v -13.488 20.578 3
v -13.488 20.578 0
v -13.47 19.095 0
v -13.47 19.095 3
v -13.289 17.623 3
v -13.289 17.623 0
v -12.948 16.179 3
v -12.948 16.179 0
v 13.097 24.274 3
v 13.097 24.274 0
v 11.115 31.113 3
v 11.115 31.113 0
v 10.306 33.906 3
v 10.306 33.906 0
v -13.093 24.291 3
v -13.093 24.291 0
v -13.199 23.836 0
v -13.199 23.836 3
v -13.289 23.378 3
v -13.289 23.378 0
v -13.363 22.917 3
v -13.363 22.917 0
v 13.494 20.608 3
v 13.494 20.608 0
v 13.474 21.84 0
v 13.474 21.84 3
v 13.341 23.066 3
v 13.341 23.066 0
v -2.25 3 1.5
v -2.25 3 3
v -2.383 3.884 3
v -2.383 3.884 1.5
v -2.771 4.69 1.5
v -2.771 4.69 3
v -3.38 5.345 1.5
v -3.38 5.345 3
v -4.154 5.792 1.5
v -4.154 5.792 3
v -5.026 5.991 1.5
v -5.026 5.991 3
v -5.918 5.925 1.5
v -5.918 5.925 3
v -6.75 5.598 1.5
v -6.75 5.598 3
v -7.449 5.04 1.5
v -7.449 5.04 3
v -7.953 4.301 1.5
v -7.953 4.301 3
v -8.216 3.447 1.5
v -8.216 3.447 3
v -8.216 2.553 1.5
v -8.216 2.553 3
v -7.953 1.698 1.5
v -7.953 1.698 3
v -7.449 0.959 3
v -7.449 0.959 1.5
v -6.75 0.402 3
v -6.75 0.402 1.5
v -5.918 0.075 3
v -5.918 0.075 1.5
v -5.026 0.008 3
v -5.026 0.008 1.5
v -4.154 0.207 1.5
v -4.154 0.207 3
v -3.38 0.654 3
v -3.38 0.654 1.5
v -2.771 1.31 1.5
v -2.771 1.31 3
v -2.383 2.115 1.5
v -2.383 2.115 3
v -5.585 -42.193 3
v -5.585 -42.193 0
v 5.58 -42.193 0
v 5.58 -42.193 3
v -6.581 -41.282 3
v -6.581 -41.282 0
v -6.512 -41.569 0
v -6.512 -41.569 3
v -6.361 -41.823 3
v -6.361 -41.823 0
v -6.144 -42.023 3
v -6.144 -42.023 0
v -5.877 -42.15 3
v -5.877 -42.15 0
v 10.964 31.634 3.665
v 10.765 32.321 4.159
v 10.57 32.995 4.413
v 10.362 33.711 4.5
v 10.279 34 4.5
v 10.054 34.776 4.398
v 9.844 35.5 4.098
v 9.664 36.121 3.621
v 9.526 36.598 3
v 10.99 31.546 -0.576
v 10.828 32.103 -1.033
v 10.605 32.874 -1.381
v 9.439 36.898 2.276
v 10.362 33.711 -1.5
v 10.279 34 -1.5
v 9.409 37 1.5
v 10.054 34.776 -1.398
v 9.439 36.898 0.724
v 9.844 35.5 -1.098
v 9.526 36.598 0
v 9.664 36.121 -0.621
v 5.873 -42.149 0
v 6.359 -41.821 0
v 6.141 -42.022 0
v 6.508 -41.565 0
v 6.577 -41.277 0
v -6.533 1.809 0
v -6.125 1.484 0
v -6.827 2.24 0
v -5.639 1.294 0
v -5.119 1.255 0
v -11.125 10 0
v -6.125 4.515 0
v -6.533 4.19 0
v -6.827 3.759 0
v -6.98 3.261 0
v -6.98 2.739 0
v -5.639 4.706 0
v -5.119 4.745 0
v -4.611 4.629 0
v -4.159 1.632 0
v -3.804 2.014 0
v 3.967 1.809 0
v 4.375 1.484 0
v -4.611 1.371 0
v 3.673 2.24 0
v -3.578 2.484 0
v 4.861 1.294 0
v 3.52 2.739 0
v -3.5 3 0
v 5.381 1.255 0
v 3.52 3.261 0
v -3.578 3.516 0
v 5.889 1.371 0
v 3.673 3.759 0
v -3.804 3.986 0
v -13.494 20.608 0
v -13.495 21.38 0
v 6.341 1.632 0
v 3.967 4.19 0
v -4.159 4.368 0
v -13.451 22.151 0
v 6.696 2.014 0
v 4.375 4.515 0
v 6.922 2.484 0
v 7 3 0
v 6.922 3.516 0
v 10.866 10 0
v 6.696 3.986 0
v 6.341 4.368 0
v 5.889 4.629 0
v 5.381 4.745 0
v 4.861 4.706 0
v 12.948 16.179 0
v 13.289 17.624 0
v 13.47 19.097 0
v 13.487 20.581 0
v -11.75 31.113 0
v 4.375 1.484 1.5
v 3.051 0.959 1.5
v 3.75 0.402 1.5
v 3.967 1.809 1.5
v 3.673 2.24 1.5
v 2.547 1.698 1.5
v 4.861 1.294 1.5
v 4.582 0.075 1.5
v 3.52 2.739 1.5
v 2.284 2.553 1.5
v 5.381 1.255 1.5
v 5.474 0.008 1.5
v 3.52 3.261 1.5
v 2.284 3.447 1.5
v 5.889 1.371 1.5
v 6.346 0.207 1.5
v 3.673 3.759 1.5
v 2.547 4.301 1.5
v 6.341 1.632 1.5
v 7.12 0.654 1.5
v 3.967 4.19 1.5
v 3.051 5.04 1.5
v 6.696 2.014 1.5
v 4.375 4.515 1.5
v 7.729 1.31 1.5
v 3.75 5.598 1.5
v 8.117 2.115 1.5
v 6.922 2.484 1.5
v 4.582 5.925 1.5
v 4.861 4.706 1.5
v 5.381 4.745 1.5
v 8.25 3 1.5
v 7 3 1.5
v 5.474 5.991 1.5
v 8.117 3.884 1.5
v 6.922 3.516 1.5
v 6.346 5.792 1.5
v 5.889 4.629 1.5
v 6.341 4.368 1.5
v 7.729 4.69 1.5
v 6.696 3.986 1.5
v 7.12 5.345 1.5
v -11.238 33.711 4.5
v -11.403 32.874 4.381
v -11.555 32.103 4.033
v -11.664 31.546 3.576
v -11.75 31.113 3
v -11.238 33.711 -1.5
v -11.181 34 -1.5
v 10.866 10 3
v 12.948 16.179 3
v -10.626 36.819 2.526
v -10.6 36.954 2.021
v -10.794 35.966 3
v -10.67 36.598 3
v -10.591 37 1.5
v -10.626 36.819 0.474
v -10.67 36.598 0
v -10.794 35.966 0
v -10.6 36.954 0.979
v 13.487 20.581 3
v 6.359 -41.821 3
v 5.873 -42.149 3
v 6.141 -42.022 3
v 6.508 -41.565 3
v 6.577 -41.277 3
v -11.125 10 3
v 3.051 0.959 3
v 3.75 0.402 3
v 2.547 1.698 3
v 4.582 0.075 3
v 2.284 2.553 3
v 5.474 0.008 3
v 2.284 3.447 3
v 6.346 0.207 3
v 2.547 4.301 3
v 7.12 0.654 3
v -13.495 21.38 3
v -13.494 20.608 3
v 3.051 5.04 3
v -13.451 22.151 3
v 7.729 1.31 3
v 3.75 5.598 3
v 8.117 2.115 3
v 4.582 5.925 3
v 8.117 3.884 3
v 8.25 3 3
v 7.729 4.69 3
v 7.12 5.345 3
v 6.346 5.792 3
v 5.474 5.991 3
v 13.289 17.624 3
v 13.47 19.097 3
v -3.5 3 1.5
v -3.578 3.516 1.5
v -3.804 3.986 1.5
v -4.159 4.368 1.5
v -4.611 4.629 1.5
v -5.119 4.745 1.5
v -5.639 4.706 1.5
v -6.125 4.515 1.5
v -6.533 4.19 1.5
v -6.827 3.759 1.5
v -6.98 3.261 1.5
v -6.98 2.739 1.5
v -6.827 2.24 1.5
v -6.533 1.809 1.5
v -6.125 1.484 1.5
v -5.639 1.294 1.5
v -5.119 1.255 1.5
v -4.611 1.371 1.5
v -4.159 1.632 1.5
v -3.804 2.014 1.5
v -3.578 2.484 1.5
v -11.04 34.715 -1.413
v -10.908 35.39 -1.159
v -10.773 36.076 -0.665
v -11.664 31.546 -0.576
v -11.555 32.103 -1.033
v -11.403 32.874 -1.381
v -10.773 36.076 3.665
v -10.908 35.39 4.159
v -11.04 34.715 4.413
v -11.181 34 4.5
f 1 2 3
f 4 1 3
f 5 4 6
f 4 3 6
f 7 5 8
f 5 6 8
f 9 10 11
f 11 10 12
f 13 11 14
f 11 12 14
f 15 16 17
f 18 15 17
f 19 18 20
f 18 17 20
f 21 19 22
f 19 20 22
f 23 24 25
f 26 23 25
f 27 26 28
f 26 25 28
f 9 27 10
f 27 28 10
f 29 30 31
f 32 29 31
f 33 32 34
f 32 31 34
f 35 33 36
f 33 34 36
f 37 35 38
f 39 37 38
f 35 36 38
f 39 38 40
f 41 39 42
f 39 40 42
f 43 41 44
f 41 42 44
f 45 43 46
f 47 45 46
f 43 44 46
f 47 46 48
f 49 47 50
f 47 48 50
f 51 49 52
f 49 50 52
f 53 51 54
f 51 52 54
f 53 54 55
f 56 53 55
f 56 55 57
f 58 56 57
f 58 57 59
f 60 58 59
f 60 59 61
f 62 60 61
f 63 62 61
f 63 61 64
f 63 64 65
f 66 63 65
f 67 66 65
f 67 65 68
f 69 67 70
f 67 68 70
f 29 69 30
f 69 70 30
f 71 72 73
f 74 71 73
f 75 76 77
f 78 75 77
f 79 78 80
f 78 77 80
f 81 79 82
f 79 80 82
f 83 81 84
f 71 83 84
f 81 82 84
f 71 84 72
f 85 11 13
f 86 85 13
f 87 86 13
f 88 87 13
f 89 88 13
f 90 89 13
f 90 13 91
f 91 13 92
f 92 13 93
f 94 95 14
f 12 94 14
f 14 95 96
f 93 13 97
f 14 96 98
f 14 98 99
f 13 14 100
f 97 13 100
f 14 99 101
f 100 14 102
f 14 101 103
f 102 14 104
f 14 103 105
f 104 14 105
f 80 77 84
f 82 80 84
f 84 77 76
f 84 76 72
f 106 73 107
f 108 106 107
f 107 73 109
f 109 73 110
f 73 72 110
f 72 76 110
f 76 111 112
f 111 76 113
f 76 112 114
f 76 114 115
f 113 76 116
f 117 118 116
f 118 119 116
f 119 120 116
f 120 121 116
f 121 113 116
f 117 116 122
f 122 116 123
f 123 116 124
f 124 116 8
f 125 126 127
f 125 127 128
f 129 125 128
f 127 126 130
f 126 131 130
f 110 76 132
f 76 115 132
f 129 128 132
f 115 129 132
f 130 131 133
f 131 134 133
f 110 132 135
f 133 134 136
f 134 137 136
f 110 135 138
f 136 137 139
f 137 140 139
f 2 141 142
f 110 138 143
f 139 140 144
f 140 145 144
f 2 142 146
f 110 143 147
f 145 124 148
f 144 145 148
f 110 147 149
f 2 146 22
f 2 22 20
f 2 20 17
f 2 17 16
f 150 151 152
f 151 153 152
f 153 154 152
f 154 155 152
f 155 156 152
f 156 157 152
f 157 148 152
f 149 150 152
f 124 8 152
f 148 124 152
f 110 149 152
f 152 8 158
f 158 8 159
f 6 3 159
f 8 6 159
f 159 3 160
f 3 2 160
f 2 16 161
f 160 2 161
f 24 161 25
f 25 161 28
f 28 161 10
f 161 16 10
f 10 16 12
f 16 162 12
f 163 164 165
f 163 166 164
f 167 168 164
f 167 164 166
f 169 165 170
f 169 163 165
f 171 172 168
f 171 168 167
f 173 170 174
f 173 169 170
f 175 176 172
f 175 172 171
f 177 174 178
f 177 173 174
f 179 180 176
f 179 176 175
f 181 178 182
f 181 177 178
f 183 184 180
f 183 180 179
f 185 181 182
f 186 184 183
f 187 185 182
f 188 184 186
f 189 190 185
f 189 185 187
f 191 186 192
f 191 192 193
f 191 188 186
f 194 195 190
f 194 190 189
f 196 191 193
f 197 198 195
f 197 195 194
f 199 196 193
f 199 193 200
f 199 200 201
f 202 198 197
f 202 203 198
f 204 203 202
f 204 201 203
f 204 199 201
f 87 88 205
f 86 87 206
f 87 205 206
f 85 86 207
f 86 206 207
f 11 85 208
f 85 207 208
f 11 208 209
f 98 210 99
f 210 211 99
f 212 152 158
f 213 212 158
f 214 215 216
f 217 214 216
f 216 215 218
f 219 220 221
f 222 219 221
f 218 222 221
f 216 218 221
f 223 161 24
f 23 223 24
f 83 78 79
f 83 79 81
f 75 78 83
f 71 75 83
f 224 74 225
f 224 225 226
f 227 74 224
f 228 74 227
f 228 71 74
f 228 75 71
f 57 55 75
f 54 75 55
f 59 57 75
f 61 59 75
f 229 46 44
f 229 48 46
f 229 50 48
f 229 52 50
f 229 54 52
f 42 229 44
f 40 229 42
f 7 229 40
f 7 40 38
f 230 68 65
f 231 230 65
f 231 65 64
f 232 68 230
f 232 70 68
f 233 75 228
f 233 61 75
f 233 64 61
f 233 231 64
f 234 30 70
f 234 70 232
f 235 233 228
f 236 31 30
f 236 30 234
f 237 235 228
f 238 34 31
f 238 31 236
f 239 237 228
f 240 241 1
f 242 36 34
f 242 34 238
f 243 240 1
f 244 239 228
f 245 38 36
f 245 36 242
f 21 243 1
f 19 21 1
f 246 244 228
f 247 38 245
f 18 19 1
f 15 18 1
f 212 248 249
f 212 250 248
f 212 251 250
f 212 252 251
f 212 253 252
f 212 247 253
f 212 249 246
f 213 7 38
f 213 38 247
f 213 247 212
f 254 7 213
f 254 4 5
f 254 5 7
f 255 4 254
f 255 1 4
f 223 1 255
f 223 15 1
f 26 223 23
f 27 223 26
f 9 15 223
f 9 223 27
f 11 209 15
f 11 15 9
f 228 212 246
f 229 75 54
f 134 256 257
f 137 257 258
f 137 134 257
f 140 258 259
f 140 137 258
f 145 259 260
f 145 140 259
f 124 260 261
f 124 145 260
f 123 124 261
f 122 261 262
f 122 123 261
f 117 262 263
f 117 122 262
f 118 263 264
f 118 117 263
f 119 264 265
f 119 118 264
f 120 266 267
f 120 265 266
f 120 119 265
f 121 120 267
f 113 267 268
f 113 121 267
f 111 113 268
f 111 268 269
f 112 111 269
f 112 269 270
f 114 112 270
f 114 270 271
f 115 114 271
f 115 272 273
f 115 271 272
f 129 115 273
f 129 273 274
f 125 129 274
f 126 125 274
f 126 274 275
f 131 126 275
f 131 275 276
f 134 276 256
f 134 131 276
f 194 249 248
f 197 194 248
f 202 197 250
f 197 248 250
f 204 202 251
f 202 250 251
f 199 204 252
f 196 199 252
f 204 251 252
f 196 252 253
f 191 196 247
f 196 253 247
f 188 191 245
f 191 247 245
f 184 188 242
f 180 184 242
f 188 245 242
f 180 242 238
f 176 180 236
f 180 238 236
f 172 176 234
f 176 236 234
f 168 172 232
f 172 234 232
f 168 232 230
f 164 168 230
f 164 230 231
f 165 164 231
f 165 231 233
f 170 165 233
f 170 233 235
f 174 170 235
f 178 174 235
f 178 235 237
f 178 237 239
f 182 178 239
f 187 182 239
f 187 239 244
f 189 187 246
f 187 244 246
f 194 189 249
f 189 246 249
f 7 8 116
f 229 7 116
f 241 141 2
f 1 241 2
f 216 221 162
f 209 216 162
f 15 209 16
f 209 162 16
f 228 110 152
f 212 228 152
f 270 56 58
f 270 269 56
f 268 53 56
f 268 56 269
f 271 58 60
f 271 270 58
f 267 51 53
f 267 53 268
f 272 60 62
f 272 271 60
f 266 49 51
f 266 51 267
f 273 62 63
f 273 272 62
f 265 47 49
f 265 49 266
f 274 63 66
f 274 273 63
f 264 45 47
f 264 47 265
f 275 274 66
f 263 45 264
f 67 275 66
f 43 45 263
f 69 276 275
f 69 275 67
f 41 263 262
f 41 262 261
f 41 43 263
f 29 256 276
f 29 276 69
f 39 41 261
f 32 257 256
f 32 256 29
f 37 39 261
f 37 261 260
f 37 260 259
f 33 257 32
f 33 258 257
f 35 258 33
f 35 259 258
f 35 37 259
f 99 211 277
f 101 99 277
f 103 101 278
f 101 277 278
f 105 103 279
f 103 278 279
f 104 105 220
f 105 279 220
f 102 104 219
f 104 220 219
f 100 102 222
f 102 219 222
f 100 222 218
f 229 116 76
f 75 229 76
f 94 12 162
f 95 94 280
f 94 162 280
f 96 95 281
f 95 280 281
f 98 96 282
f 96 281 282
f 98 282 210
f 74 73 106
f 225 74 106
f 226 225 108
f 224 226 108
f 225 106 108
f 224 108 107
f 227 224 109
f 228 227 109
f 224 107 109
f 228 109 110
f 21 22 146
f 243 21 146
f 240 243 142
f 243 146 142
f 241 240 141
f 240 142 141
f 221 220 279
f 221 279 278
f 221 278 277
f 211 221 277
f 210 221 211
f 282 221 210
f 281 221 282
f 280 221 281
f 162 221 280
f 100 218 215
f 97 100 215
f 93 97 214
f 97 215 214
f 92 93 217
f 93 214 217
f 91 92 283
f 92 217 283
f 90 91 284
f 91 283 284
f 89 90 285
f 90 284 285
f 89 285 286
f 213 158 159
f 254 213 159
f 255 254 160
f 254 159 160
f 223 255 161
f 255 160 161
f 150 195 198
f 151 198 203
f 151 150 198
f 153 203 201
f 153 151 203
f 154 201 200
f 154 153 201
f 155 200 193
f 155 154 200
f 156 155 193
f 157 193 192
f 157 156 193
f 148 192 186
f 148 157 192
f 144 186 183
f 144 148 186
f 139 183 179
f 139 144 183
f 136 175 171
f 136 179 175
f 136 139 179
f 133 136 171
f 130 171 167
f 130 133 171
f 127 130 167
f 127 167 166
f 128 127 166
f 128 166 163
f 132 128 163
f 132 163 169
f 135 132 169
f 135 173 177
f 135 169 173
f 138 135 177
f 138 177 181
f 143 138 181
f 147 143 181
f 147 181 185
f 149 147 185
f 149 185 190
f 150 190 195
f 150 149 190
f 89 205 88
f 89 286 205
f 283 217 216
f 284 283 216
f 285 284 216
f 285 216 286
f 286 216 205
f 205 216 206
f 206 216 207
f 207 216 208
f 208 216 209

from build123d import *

# Parameters (mm, degrees)
F0_R          = 1.75
F1_DEPTH      = 3
F3_DEPTH      = 1.5
F3_DEPTH_BACK = 4.5
F4_T1_DEPTH   = 35.8553046099
F4_T3_DEPTH   = 35
F5_R          = 3
F6_DEPTH      = 1.5


# Not quite as in the source:
# - a fillet or chamfer that OpenCascade refuses, or shapes differently, is made with other operations: its cross-section is extruded or revolved along the edge and cut away or added
# - a feature names something its author has since deleted; it is built from what else it names


with BuildPart() as f1:
    # F0 (on Top) → F1 (new body)
    with BuildSketch(Plane.XY):
        with BuildLine():
            Line((-5.5846913819, -42.1934081889), (5.5801667099, -42.1934081889))
            ThreePointArc((5.5801667099, -42.1934081889), (6.2571567858, -41.9294003336), (6.5766854657, -41.2767770629))
            Line((6.5766854657, -41.2767770629), (10.8664863973, 9.9997591089))
            Line((10.8664863973, 9.9997591089), (12.9481358013, 16.1793168214))
            ThreePointArc((12.9481358013, 16.1793168214), (13.3997566467, 18.3576501573), (13.4874998392, 20.5805758517))
            Line((13.4874998392, 20.5805758517), (13.4943094486, 20.6080656878))
            ThreePointArc((13.4943094486, 20.6080656878), (13.4214184301, 22.4544852439), (13.0970679667, 24.2736540252))
            Line((13.0970679667, 24.2736540252), (10.3058793621, 33.9058264779))
            Line((10.3058793621, 33.9058264779), (9.4093267365, 36.9997591089))
            Line((9.4093267365, 36.9997591089), (4.9829727946, 36.9997591089))
            Line((4.9829727946, 36.9997591089), (-5.25, 36.9997591089))
            Line((-5.25, 36.9997591089), (-10.5906732635, 36.9997591089))
            Line((-10.5906732635, 36.9997591089), (-10.7942270682, 35.9658364889))
            Line((-10.7942270682, 35.9658364889), (-13.0926909538, 24.2911158576))
            Line((-13.0926909538, 24.2911158576), (-13.3631447598, 22.9173841889))
            ThreePointArc((-13.3631447598, 22.9173841889), (-13.4782769531, 21.765539271), (-13.4943094486, 20.6080656878))
            Line((-13.4943094486, 20.6080656878), (-13.4876078419, 20.5780624058))
            ThreePointArc((-13.4876078419, 20.5780624058), (-13.3996035826, 18.3564016222), (-12.9481358013, 16.1793168214))
            Line((-12.9481358013, 16.1793168214), (-11.1248120452, 9.9997591089))
            Line((-11.1248120452, 9.9997591089), (-6.5807885254, -41.281671889))
            ThreePointArc((-6.5807885254, -41.281671889), (-6.259871469, -41.9310611222), (-5.5846913819, -42.1934081889))
        make_face()
        with Locations((-5.25, 2.9997591089)):
            Circle(F0_R, mode=Mode.SUBTRACT)
        with Locations((5.25, 2.9997591089)):
            Circle(F0_R, mode=Mode.SUBTRACT)
        with BuildLine():
            ThreePointArc((-13.0926909538, 24.2911158576), (-13.2457387677, 23.6077585201), (-13.3631447598, 22.9173841889))
            Line((-13.3631447598, 22.9173841889), (-13.0926909538, 24.2911158576))
        make_face()
    extrude(amount=F1_DEPTH)

    # F2 (on face) → F3 (join, two sides)
    with BuildSketch(Plane.XY.offset(3)) as f3_sk:
        Polygon((9.4093267365, 36.9997591089), (-10.5906732635, 36.9997591089), (-11.7496770502, 31.1127641011), (11.1152465029, 31.1127641011), align=None)
    extrude(amount=F3_DEPTH)
    extrude(f3_sk.sketch, amount=-F3_DEPTH_BACK)

    # F4: fillet of radius 3 on 4 edges, made by hand

    # F4_s2 → F4_t1 (cut)
    with BuildSketch(Plane.YZ.offset(-18.2448675786)):
        with BuildLine():
            ThreePointArc((33.7108403124, 4.5), (32.2108403124, 4.0980762114), (31.1127641011, 3))
            Line((31.1127641011, 3), (31.1127641011, 4.5))
            Line((31.1127641011, 4.5), (33.7108403124, 4.5))
        make_face()
        with BuildLine():
            ThreePointArc((31.1127641011, 0), (32.2108403124, -1.0980762114), (33.7108403124, -1.5))
            Line((33.7108403124, -1.5), (31.1127641011, -1.5))
            Line((31.1127641011, -1.5), (31.1127641011, 0))
        make_face()
    extrude(amount=F4_T1_DEPTH, mode=Mode.SUBTRACT)

    # F4_s4 → F4_t3 (cut)
    with BuildSketch(Plane.YZ.offset(-18.0906732635)):
        with BuildLine():
            ThreePointArc((36.9997591089, 1.5), (36.1210794525, 3.6213203436), (33.9997591089, 4.5))
            Line((33.9997591089, 4.5), (36.9997591089, 4.5))
            Line((36.9997591089, 4.5), (36.9997591089, 1.5))
        make_face()
        with BuildLine():
            ThreePointArc((33.9997591089, -1.5), (36.1210794525, -0.6213203436), (36.9997591089, 1.5))
            Line((36.9997591089, 1.5), (36.9997591089, -1.5))
            Line((36.9997591089, -1.5), (33.9997591089, -1.5))
        make_face()
    extrude(amount=F4_T3_DEPTH, mode=Mode.SUBTRACT)

    # F5 (on face) → F6 (cut)
    with BuildSketch(Plane.XY.offset(3)):
        with Locations((-5.25, 2.9997591089)):
            Circle(F5_R)
        with Locations((5.25, 2.9997591089)):
            Circle(F5_R)
    extrude(amount=-F6_DEPTH, mode=Mode.SUBTRACT)


solid = f1.part
